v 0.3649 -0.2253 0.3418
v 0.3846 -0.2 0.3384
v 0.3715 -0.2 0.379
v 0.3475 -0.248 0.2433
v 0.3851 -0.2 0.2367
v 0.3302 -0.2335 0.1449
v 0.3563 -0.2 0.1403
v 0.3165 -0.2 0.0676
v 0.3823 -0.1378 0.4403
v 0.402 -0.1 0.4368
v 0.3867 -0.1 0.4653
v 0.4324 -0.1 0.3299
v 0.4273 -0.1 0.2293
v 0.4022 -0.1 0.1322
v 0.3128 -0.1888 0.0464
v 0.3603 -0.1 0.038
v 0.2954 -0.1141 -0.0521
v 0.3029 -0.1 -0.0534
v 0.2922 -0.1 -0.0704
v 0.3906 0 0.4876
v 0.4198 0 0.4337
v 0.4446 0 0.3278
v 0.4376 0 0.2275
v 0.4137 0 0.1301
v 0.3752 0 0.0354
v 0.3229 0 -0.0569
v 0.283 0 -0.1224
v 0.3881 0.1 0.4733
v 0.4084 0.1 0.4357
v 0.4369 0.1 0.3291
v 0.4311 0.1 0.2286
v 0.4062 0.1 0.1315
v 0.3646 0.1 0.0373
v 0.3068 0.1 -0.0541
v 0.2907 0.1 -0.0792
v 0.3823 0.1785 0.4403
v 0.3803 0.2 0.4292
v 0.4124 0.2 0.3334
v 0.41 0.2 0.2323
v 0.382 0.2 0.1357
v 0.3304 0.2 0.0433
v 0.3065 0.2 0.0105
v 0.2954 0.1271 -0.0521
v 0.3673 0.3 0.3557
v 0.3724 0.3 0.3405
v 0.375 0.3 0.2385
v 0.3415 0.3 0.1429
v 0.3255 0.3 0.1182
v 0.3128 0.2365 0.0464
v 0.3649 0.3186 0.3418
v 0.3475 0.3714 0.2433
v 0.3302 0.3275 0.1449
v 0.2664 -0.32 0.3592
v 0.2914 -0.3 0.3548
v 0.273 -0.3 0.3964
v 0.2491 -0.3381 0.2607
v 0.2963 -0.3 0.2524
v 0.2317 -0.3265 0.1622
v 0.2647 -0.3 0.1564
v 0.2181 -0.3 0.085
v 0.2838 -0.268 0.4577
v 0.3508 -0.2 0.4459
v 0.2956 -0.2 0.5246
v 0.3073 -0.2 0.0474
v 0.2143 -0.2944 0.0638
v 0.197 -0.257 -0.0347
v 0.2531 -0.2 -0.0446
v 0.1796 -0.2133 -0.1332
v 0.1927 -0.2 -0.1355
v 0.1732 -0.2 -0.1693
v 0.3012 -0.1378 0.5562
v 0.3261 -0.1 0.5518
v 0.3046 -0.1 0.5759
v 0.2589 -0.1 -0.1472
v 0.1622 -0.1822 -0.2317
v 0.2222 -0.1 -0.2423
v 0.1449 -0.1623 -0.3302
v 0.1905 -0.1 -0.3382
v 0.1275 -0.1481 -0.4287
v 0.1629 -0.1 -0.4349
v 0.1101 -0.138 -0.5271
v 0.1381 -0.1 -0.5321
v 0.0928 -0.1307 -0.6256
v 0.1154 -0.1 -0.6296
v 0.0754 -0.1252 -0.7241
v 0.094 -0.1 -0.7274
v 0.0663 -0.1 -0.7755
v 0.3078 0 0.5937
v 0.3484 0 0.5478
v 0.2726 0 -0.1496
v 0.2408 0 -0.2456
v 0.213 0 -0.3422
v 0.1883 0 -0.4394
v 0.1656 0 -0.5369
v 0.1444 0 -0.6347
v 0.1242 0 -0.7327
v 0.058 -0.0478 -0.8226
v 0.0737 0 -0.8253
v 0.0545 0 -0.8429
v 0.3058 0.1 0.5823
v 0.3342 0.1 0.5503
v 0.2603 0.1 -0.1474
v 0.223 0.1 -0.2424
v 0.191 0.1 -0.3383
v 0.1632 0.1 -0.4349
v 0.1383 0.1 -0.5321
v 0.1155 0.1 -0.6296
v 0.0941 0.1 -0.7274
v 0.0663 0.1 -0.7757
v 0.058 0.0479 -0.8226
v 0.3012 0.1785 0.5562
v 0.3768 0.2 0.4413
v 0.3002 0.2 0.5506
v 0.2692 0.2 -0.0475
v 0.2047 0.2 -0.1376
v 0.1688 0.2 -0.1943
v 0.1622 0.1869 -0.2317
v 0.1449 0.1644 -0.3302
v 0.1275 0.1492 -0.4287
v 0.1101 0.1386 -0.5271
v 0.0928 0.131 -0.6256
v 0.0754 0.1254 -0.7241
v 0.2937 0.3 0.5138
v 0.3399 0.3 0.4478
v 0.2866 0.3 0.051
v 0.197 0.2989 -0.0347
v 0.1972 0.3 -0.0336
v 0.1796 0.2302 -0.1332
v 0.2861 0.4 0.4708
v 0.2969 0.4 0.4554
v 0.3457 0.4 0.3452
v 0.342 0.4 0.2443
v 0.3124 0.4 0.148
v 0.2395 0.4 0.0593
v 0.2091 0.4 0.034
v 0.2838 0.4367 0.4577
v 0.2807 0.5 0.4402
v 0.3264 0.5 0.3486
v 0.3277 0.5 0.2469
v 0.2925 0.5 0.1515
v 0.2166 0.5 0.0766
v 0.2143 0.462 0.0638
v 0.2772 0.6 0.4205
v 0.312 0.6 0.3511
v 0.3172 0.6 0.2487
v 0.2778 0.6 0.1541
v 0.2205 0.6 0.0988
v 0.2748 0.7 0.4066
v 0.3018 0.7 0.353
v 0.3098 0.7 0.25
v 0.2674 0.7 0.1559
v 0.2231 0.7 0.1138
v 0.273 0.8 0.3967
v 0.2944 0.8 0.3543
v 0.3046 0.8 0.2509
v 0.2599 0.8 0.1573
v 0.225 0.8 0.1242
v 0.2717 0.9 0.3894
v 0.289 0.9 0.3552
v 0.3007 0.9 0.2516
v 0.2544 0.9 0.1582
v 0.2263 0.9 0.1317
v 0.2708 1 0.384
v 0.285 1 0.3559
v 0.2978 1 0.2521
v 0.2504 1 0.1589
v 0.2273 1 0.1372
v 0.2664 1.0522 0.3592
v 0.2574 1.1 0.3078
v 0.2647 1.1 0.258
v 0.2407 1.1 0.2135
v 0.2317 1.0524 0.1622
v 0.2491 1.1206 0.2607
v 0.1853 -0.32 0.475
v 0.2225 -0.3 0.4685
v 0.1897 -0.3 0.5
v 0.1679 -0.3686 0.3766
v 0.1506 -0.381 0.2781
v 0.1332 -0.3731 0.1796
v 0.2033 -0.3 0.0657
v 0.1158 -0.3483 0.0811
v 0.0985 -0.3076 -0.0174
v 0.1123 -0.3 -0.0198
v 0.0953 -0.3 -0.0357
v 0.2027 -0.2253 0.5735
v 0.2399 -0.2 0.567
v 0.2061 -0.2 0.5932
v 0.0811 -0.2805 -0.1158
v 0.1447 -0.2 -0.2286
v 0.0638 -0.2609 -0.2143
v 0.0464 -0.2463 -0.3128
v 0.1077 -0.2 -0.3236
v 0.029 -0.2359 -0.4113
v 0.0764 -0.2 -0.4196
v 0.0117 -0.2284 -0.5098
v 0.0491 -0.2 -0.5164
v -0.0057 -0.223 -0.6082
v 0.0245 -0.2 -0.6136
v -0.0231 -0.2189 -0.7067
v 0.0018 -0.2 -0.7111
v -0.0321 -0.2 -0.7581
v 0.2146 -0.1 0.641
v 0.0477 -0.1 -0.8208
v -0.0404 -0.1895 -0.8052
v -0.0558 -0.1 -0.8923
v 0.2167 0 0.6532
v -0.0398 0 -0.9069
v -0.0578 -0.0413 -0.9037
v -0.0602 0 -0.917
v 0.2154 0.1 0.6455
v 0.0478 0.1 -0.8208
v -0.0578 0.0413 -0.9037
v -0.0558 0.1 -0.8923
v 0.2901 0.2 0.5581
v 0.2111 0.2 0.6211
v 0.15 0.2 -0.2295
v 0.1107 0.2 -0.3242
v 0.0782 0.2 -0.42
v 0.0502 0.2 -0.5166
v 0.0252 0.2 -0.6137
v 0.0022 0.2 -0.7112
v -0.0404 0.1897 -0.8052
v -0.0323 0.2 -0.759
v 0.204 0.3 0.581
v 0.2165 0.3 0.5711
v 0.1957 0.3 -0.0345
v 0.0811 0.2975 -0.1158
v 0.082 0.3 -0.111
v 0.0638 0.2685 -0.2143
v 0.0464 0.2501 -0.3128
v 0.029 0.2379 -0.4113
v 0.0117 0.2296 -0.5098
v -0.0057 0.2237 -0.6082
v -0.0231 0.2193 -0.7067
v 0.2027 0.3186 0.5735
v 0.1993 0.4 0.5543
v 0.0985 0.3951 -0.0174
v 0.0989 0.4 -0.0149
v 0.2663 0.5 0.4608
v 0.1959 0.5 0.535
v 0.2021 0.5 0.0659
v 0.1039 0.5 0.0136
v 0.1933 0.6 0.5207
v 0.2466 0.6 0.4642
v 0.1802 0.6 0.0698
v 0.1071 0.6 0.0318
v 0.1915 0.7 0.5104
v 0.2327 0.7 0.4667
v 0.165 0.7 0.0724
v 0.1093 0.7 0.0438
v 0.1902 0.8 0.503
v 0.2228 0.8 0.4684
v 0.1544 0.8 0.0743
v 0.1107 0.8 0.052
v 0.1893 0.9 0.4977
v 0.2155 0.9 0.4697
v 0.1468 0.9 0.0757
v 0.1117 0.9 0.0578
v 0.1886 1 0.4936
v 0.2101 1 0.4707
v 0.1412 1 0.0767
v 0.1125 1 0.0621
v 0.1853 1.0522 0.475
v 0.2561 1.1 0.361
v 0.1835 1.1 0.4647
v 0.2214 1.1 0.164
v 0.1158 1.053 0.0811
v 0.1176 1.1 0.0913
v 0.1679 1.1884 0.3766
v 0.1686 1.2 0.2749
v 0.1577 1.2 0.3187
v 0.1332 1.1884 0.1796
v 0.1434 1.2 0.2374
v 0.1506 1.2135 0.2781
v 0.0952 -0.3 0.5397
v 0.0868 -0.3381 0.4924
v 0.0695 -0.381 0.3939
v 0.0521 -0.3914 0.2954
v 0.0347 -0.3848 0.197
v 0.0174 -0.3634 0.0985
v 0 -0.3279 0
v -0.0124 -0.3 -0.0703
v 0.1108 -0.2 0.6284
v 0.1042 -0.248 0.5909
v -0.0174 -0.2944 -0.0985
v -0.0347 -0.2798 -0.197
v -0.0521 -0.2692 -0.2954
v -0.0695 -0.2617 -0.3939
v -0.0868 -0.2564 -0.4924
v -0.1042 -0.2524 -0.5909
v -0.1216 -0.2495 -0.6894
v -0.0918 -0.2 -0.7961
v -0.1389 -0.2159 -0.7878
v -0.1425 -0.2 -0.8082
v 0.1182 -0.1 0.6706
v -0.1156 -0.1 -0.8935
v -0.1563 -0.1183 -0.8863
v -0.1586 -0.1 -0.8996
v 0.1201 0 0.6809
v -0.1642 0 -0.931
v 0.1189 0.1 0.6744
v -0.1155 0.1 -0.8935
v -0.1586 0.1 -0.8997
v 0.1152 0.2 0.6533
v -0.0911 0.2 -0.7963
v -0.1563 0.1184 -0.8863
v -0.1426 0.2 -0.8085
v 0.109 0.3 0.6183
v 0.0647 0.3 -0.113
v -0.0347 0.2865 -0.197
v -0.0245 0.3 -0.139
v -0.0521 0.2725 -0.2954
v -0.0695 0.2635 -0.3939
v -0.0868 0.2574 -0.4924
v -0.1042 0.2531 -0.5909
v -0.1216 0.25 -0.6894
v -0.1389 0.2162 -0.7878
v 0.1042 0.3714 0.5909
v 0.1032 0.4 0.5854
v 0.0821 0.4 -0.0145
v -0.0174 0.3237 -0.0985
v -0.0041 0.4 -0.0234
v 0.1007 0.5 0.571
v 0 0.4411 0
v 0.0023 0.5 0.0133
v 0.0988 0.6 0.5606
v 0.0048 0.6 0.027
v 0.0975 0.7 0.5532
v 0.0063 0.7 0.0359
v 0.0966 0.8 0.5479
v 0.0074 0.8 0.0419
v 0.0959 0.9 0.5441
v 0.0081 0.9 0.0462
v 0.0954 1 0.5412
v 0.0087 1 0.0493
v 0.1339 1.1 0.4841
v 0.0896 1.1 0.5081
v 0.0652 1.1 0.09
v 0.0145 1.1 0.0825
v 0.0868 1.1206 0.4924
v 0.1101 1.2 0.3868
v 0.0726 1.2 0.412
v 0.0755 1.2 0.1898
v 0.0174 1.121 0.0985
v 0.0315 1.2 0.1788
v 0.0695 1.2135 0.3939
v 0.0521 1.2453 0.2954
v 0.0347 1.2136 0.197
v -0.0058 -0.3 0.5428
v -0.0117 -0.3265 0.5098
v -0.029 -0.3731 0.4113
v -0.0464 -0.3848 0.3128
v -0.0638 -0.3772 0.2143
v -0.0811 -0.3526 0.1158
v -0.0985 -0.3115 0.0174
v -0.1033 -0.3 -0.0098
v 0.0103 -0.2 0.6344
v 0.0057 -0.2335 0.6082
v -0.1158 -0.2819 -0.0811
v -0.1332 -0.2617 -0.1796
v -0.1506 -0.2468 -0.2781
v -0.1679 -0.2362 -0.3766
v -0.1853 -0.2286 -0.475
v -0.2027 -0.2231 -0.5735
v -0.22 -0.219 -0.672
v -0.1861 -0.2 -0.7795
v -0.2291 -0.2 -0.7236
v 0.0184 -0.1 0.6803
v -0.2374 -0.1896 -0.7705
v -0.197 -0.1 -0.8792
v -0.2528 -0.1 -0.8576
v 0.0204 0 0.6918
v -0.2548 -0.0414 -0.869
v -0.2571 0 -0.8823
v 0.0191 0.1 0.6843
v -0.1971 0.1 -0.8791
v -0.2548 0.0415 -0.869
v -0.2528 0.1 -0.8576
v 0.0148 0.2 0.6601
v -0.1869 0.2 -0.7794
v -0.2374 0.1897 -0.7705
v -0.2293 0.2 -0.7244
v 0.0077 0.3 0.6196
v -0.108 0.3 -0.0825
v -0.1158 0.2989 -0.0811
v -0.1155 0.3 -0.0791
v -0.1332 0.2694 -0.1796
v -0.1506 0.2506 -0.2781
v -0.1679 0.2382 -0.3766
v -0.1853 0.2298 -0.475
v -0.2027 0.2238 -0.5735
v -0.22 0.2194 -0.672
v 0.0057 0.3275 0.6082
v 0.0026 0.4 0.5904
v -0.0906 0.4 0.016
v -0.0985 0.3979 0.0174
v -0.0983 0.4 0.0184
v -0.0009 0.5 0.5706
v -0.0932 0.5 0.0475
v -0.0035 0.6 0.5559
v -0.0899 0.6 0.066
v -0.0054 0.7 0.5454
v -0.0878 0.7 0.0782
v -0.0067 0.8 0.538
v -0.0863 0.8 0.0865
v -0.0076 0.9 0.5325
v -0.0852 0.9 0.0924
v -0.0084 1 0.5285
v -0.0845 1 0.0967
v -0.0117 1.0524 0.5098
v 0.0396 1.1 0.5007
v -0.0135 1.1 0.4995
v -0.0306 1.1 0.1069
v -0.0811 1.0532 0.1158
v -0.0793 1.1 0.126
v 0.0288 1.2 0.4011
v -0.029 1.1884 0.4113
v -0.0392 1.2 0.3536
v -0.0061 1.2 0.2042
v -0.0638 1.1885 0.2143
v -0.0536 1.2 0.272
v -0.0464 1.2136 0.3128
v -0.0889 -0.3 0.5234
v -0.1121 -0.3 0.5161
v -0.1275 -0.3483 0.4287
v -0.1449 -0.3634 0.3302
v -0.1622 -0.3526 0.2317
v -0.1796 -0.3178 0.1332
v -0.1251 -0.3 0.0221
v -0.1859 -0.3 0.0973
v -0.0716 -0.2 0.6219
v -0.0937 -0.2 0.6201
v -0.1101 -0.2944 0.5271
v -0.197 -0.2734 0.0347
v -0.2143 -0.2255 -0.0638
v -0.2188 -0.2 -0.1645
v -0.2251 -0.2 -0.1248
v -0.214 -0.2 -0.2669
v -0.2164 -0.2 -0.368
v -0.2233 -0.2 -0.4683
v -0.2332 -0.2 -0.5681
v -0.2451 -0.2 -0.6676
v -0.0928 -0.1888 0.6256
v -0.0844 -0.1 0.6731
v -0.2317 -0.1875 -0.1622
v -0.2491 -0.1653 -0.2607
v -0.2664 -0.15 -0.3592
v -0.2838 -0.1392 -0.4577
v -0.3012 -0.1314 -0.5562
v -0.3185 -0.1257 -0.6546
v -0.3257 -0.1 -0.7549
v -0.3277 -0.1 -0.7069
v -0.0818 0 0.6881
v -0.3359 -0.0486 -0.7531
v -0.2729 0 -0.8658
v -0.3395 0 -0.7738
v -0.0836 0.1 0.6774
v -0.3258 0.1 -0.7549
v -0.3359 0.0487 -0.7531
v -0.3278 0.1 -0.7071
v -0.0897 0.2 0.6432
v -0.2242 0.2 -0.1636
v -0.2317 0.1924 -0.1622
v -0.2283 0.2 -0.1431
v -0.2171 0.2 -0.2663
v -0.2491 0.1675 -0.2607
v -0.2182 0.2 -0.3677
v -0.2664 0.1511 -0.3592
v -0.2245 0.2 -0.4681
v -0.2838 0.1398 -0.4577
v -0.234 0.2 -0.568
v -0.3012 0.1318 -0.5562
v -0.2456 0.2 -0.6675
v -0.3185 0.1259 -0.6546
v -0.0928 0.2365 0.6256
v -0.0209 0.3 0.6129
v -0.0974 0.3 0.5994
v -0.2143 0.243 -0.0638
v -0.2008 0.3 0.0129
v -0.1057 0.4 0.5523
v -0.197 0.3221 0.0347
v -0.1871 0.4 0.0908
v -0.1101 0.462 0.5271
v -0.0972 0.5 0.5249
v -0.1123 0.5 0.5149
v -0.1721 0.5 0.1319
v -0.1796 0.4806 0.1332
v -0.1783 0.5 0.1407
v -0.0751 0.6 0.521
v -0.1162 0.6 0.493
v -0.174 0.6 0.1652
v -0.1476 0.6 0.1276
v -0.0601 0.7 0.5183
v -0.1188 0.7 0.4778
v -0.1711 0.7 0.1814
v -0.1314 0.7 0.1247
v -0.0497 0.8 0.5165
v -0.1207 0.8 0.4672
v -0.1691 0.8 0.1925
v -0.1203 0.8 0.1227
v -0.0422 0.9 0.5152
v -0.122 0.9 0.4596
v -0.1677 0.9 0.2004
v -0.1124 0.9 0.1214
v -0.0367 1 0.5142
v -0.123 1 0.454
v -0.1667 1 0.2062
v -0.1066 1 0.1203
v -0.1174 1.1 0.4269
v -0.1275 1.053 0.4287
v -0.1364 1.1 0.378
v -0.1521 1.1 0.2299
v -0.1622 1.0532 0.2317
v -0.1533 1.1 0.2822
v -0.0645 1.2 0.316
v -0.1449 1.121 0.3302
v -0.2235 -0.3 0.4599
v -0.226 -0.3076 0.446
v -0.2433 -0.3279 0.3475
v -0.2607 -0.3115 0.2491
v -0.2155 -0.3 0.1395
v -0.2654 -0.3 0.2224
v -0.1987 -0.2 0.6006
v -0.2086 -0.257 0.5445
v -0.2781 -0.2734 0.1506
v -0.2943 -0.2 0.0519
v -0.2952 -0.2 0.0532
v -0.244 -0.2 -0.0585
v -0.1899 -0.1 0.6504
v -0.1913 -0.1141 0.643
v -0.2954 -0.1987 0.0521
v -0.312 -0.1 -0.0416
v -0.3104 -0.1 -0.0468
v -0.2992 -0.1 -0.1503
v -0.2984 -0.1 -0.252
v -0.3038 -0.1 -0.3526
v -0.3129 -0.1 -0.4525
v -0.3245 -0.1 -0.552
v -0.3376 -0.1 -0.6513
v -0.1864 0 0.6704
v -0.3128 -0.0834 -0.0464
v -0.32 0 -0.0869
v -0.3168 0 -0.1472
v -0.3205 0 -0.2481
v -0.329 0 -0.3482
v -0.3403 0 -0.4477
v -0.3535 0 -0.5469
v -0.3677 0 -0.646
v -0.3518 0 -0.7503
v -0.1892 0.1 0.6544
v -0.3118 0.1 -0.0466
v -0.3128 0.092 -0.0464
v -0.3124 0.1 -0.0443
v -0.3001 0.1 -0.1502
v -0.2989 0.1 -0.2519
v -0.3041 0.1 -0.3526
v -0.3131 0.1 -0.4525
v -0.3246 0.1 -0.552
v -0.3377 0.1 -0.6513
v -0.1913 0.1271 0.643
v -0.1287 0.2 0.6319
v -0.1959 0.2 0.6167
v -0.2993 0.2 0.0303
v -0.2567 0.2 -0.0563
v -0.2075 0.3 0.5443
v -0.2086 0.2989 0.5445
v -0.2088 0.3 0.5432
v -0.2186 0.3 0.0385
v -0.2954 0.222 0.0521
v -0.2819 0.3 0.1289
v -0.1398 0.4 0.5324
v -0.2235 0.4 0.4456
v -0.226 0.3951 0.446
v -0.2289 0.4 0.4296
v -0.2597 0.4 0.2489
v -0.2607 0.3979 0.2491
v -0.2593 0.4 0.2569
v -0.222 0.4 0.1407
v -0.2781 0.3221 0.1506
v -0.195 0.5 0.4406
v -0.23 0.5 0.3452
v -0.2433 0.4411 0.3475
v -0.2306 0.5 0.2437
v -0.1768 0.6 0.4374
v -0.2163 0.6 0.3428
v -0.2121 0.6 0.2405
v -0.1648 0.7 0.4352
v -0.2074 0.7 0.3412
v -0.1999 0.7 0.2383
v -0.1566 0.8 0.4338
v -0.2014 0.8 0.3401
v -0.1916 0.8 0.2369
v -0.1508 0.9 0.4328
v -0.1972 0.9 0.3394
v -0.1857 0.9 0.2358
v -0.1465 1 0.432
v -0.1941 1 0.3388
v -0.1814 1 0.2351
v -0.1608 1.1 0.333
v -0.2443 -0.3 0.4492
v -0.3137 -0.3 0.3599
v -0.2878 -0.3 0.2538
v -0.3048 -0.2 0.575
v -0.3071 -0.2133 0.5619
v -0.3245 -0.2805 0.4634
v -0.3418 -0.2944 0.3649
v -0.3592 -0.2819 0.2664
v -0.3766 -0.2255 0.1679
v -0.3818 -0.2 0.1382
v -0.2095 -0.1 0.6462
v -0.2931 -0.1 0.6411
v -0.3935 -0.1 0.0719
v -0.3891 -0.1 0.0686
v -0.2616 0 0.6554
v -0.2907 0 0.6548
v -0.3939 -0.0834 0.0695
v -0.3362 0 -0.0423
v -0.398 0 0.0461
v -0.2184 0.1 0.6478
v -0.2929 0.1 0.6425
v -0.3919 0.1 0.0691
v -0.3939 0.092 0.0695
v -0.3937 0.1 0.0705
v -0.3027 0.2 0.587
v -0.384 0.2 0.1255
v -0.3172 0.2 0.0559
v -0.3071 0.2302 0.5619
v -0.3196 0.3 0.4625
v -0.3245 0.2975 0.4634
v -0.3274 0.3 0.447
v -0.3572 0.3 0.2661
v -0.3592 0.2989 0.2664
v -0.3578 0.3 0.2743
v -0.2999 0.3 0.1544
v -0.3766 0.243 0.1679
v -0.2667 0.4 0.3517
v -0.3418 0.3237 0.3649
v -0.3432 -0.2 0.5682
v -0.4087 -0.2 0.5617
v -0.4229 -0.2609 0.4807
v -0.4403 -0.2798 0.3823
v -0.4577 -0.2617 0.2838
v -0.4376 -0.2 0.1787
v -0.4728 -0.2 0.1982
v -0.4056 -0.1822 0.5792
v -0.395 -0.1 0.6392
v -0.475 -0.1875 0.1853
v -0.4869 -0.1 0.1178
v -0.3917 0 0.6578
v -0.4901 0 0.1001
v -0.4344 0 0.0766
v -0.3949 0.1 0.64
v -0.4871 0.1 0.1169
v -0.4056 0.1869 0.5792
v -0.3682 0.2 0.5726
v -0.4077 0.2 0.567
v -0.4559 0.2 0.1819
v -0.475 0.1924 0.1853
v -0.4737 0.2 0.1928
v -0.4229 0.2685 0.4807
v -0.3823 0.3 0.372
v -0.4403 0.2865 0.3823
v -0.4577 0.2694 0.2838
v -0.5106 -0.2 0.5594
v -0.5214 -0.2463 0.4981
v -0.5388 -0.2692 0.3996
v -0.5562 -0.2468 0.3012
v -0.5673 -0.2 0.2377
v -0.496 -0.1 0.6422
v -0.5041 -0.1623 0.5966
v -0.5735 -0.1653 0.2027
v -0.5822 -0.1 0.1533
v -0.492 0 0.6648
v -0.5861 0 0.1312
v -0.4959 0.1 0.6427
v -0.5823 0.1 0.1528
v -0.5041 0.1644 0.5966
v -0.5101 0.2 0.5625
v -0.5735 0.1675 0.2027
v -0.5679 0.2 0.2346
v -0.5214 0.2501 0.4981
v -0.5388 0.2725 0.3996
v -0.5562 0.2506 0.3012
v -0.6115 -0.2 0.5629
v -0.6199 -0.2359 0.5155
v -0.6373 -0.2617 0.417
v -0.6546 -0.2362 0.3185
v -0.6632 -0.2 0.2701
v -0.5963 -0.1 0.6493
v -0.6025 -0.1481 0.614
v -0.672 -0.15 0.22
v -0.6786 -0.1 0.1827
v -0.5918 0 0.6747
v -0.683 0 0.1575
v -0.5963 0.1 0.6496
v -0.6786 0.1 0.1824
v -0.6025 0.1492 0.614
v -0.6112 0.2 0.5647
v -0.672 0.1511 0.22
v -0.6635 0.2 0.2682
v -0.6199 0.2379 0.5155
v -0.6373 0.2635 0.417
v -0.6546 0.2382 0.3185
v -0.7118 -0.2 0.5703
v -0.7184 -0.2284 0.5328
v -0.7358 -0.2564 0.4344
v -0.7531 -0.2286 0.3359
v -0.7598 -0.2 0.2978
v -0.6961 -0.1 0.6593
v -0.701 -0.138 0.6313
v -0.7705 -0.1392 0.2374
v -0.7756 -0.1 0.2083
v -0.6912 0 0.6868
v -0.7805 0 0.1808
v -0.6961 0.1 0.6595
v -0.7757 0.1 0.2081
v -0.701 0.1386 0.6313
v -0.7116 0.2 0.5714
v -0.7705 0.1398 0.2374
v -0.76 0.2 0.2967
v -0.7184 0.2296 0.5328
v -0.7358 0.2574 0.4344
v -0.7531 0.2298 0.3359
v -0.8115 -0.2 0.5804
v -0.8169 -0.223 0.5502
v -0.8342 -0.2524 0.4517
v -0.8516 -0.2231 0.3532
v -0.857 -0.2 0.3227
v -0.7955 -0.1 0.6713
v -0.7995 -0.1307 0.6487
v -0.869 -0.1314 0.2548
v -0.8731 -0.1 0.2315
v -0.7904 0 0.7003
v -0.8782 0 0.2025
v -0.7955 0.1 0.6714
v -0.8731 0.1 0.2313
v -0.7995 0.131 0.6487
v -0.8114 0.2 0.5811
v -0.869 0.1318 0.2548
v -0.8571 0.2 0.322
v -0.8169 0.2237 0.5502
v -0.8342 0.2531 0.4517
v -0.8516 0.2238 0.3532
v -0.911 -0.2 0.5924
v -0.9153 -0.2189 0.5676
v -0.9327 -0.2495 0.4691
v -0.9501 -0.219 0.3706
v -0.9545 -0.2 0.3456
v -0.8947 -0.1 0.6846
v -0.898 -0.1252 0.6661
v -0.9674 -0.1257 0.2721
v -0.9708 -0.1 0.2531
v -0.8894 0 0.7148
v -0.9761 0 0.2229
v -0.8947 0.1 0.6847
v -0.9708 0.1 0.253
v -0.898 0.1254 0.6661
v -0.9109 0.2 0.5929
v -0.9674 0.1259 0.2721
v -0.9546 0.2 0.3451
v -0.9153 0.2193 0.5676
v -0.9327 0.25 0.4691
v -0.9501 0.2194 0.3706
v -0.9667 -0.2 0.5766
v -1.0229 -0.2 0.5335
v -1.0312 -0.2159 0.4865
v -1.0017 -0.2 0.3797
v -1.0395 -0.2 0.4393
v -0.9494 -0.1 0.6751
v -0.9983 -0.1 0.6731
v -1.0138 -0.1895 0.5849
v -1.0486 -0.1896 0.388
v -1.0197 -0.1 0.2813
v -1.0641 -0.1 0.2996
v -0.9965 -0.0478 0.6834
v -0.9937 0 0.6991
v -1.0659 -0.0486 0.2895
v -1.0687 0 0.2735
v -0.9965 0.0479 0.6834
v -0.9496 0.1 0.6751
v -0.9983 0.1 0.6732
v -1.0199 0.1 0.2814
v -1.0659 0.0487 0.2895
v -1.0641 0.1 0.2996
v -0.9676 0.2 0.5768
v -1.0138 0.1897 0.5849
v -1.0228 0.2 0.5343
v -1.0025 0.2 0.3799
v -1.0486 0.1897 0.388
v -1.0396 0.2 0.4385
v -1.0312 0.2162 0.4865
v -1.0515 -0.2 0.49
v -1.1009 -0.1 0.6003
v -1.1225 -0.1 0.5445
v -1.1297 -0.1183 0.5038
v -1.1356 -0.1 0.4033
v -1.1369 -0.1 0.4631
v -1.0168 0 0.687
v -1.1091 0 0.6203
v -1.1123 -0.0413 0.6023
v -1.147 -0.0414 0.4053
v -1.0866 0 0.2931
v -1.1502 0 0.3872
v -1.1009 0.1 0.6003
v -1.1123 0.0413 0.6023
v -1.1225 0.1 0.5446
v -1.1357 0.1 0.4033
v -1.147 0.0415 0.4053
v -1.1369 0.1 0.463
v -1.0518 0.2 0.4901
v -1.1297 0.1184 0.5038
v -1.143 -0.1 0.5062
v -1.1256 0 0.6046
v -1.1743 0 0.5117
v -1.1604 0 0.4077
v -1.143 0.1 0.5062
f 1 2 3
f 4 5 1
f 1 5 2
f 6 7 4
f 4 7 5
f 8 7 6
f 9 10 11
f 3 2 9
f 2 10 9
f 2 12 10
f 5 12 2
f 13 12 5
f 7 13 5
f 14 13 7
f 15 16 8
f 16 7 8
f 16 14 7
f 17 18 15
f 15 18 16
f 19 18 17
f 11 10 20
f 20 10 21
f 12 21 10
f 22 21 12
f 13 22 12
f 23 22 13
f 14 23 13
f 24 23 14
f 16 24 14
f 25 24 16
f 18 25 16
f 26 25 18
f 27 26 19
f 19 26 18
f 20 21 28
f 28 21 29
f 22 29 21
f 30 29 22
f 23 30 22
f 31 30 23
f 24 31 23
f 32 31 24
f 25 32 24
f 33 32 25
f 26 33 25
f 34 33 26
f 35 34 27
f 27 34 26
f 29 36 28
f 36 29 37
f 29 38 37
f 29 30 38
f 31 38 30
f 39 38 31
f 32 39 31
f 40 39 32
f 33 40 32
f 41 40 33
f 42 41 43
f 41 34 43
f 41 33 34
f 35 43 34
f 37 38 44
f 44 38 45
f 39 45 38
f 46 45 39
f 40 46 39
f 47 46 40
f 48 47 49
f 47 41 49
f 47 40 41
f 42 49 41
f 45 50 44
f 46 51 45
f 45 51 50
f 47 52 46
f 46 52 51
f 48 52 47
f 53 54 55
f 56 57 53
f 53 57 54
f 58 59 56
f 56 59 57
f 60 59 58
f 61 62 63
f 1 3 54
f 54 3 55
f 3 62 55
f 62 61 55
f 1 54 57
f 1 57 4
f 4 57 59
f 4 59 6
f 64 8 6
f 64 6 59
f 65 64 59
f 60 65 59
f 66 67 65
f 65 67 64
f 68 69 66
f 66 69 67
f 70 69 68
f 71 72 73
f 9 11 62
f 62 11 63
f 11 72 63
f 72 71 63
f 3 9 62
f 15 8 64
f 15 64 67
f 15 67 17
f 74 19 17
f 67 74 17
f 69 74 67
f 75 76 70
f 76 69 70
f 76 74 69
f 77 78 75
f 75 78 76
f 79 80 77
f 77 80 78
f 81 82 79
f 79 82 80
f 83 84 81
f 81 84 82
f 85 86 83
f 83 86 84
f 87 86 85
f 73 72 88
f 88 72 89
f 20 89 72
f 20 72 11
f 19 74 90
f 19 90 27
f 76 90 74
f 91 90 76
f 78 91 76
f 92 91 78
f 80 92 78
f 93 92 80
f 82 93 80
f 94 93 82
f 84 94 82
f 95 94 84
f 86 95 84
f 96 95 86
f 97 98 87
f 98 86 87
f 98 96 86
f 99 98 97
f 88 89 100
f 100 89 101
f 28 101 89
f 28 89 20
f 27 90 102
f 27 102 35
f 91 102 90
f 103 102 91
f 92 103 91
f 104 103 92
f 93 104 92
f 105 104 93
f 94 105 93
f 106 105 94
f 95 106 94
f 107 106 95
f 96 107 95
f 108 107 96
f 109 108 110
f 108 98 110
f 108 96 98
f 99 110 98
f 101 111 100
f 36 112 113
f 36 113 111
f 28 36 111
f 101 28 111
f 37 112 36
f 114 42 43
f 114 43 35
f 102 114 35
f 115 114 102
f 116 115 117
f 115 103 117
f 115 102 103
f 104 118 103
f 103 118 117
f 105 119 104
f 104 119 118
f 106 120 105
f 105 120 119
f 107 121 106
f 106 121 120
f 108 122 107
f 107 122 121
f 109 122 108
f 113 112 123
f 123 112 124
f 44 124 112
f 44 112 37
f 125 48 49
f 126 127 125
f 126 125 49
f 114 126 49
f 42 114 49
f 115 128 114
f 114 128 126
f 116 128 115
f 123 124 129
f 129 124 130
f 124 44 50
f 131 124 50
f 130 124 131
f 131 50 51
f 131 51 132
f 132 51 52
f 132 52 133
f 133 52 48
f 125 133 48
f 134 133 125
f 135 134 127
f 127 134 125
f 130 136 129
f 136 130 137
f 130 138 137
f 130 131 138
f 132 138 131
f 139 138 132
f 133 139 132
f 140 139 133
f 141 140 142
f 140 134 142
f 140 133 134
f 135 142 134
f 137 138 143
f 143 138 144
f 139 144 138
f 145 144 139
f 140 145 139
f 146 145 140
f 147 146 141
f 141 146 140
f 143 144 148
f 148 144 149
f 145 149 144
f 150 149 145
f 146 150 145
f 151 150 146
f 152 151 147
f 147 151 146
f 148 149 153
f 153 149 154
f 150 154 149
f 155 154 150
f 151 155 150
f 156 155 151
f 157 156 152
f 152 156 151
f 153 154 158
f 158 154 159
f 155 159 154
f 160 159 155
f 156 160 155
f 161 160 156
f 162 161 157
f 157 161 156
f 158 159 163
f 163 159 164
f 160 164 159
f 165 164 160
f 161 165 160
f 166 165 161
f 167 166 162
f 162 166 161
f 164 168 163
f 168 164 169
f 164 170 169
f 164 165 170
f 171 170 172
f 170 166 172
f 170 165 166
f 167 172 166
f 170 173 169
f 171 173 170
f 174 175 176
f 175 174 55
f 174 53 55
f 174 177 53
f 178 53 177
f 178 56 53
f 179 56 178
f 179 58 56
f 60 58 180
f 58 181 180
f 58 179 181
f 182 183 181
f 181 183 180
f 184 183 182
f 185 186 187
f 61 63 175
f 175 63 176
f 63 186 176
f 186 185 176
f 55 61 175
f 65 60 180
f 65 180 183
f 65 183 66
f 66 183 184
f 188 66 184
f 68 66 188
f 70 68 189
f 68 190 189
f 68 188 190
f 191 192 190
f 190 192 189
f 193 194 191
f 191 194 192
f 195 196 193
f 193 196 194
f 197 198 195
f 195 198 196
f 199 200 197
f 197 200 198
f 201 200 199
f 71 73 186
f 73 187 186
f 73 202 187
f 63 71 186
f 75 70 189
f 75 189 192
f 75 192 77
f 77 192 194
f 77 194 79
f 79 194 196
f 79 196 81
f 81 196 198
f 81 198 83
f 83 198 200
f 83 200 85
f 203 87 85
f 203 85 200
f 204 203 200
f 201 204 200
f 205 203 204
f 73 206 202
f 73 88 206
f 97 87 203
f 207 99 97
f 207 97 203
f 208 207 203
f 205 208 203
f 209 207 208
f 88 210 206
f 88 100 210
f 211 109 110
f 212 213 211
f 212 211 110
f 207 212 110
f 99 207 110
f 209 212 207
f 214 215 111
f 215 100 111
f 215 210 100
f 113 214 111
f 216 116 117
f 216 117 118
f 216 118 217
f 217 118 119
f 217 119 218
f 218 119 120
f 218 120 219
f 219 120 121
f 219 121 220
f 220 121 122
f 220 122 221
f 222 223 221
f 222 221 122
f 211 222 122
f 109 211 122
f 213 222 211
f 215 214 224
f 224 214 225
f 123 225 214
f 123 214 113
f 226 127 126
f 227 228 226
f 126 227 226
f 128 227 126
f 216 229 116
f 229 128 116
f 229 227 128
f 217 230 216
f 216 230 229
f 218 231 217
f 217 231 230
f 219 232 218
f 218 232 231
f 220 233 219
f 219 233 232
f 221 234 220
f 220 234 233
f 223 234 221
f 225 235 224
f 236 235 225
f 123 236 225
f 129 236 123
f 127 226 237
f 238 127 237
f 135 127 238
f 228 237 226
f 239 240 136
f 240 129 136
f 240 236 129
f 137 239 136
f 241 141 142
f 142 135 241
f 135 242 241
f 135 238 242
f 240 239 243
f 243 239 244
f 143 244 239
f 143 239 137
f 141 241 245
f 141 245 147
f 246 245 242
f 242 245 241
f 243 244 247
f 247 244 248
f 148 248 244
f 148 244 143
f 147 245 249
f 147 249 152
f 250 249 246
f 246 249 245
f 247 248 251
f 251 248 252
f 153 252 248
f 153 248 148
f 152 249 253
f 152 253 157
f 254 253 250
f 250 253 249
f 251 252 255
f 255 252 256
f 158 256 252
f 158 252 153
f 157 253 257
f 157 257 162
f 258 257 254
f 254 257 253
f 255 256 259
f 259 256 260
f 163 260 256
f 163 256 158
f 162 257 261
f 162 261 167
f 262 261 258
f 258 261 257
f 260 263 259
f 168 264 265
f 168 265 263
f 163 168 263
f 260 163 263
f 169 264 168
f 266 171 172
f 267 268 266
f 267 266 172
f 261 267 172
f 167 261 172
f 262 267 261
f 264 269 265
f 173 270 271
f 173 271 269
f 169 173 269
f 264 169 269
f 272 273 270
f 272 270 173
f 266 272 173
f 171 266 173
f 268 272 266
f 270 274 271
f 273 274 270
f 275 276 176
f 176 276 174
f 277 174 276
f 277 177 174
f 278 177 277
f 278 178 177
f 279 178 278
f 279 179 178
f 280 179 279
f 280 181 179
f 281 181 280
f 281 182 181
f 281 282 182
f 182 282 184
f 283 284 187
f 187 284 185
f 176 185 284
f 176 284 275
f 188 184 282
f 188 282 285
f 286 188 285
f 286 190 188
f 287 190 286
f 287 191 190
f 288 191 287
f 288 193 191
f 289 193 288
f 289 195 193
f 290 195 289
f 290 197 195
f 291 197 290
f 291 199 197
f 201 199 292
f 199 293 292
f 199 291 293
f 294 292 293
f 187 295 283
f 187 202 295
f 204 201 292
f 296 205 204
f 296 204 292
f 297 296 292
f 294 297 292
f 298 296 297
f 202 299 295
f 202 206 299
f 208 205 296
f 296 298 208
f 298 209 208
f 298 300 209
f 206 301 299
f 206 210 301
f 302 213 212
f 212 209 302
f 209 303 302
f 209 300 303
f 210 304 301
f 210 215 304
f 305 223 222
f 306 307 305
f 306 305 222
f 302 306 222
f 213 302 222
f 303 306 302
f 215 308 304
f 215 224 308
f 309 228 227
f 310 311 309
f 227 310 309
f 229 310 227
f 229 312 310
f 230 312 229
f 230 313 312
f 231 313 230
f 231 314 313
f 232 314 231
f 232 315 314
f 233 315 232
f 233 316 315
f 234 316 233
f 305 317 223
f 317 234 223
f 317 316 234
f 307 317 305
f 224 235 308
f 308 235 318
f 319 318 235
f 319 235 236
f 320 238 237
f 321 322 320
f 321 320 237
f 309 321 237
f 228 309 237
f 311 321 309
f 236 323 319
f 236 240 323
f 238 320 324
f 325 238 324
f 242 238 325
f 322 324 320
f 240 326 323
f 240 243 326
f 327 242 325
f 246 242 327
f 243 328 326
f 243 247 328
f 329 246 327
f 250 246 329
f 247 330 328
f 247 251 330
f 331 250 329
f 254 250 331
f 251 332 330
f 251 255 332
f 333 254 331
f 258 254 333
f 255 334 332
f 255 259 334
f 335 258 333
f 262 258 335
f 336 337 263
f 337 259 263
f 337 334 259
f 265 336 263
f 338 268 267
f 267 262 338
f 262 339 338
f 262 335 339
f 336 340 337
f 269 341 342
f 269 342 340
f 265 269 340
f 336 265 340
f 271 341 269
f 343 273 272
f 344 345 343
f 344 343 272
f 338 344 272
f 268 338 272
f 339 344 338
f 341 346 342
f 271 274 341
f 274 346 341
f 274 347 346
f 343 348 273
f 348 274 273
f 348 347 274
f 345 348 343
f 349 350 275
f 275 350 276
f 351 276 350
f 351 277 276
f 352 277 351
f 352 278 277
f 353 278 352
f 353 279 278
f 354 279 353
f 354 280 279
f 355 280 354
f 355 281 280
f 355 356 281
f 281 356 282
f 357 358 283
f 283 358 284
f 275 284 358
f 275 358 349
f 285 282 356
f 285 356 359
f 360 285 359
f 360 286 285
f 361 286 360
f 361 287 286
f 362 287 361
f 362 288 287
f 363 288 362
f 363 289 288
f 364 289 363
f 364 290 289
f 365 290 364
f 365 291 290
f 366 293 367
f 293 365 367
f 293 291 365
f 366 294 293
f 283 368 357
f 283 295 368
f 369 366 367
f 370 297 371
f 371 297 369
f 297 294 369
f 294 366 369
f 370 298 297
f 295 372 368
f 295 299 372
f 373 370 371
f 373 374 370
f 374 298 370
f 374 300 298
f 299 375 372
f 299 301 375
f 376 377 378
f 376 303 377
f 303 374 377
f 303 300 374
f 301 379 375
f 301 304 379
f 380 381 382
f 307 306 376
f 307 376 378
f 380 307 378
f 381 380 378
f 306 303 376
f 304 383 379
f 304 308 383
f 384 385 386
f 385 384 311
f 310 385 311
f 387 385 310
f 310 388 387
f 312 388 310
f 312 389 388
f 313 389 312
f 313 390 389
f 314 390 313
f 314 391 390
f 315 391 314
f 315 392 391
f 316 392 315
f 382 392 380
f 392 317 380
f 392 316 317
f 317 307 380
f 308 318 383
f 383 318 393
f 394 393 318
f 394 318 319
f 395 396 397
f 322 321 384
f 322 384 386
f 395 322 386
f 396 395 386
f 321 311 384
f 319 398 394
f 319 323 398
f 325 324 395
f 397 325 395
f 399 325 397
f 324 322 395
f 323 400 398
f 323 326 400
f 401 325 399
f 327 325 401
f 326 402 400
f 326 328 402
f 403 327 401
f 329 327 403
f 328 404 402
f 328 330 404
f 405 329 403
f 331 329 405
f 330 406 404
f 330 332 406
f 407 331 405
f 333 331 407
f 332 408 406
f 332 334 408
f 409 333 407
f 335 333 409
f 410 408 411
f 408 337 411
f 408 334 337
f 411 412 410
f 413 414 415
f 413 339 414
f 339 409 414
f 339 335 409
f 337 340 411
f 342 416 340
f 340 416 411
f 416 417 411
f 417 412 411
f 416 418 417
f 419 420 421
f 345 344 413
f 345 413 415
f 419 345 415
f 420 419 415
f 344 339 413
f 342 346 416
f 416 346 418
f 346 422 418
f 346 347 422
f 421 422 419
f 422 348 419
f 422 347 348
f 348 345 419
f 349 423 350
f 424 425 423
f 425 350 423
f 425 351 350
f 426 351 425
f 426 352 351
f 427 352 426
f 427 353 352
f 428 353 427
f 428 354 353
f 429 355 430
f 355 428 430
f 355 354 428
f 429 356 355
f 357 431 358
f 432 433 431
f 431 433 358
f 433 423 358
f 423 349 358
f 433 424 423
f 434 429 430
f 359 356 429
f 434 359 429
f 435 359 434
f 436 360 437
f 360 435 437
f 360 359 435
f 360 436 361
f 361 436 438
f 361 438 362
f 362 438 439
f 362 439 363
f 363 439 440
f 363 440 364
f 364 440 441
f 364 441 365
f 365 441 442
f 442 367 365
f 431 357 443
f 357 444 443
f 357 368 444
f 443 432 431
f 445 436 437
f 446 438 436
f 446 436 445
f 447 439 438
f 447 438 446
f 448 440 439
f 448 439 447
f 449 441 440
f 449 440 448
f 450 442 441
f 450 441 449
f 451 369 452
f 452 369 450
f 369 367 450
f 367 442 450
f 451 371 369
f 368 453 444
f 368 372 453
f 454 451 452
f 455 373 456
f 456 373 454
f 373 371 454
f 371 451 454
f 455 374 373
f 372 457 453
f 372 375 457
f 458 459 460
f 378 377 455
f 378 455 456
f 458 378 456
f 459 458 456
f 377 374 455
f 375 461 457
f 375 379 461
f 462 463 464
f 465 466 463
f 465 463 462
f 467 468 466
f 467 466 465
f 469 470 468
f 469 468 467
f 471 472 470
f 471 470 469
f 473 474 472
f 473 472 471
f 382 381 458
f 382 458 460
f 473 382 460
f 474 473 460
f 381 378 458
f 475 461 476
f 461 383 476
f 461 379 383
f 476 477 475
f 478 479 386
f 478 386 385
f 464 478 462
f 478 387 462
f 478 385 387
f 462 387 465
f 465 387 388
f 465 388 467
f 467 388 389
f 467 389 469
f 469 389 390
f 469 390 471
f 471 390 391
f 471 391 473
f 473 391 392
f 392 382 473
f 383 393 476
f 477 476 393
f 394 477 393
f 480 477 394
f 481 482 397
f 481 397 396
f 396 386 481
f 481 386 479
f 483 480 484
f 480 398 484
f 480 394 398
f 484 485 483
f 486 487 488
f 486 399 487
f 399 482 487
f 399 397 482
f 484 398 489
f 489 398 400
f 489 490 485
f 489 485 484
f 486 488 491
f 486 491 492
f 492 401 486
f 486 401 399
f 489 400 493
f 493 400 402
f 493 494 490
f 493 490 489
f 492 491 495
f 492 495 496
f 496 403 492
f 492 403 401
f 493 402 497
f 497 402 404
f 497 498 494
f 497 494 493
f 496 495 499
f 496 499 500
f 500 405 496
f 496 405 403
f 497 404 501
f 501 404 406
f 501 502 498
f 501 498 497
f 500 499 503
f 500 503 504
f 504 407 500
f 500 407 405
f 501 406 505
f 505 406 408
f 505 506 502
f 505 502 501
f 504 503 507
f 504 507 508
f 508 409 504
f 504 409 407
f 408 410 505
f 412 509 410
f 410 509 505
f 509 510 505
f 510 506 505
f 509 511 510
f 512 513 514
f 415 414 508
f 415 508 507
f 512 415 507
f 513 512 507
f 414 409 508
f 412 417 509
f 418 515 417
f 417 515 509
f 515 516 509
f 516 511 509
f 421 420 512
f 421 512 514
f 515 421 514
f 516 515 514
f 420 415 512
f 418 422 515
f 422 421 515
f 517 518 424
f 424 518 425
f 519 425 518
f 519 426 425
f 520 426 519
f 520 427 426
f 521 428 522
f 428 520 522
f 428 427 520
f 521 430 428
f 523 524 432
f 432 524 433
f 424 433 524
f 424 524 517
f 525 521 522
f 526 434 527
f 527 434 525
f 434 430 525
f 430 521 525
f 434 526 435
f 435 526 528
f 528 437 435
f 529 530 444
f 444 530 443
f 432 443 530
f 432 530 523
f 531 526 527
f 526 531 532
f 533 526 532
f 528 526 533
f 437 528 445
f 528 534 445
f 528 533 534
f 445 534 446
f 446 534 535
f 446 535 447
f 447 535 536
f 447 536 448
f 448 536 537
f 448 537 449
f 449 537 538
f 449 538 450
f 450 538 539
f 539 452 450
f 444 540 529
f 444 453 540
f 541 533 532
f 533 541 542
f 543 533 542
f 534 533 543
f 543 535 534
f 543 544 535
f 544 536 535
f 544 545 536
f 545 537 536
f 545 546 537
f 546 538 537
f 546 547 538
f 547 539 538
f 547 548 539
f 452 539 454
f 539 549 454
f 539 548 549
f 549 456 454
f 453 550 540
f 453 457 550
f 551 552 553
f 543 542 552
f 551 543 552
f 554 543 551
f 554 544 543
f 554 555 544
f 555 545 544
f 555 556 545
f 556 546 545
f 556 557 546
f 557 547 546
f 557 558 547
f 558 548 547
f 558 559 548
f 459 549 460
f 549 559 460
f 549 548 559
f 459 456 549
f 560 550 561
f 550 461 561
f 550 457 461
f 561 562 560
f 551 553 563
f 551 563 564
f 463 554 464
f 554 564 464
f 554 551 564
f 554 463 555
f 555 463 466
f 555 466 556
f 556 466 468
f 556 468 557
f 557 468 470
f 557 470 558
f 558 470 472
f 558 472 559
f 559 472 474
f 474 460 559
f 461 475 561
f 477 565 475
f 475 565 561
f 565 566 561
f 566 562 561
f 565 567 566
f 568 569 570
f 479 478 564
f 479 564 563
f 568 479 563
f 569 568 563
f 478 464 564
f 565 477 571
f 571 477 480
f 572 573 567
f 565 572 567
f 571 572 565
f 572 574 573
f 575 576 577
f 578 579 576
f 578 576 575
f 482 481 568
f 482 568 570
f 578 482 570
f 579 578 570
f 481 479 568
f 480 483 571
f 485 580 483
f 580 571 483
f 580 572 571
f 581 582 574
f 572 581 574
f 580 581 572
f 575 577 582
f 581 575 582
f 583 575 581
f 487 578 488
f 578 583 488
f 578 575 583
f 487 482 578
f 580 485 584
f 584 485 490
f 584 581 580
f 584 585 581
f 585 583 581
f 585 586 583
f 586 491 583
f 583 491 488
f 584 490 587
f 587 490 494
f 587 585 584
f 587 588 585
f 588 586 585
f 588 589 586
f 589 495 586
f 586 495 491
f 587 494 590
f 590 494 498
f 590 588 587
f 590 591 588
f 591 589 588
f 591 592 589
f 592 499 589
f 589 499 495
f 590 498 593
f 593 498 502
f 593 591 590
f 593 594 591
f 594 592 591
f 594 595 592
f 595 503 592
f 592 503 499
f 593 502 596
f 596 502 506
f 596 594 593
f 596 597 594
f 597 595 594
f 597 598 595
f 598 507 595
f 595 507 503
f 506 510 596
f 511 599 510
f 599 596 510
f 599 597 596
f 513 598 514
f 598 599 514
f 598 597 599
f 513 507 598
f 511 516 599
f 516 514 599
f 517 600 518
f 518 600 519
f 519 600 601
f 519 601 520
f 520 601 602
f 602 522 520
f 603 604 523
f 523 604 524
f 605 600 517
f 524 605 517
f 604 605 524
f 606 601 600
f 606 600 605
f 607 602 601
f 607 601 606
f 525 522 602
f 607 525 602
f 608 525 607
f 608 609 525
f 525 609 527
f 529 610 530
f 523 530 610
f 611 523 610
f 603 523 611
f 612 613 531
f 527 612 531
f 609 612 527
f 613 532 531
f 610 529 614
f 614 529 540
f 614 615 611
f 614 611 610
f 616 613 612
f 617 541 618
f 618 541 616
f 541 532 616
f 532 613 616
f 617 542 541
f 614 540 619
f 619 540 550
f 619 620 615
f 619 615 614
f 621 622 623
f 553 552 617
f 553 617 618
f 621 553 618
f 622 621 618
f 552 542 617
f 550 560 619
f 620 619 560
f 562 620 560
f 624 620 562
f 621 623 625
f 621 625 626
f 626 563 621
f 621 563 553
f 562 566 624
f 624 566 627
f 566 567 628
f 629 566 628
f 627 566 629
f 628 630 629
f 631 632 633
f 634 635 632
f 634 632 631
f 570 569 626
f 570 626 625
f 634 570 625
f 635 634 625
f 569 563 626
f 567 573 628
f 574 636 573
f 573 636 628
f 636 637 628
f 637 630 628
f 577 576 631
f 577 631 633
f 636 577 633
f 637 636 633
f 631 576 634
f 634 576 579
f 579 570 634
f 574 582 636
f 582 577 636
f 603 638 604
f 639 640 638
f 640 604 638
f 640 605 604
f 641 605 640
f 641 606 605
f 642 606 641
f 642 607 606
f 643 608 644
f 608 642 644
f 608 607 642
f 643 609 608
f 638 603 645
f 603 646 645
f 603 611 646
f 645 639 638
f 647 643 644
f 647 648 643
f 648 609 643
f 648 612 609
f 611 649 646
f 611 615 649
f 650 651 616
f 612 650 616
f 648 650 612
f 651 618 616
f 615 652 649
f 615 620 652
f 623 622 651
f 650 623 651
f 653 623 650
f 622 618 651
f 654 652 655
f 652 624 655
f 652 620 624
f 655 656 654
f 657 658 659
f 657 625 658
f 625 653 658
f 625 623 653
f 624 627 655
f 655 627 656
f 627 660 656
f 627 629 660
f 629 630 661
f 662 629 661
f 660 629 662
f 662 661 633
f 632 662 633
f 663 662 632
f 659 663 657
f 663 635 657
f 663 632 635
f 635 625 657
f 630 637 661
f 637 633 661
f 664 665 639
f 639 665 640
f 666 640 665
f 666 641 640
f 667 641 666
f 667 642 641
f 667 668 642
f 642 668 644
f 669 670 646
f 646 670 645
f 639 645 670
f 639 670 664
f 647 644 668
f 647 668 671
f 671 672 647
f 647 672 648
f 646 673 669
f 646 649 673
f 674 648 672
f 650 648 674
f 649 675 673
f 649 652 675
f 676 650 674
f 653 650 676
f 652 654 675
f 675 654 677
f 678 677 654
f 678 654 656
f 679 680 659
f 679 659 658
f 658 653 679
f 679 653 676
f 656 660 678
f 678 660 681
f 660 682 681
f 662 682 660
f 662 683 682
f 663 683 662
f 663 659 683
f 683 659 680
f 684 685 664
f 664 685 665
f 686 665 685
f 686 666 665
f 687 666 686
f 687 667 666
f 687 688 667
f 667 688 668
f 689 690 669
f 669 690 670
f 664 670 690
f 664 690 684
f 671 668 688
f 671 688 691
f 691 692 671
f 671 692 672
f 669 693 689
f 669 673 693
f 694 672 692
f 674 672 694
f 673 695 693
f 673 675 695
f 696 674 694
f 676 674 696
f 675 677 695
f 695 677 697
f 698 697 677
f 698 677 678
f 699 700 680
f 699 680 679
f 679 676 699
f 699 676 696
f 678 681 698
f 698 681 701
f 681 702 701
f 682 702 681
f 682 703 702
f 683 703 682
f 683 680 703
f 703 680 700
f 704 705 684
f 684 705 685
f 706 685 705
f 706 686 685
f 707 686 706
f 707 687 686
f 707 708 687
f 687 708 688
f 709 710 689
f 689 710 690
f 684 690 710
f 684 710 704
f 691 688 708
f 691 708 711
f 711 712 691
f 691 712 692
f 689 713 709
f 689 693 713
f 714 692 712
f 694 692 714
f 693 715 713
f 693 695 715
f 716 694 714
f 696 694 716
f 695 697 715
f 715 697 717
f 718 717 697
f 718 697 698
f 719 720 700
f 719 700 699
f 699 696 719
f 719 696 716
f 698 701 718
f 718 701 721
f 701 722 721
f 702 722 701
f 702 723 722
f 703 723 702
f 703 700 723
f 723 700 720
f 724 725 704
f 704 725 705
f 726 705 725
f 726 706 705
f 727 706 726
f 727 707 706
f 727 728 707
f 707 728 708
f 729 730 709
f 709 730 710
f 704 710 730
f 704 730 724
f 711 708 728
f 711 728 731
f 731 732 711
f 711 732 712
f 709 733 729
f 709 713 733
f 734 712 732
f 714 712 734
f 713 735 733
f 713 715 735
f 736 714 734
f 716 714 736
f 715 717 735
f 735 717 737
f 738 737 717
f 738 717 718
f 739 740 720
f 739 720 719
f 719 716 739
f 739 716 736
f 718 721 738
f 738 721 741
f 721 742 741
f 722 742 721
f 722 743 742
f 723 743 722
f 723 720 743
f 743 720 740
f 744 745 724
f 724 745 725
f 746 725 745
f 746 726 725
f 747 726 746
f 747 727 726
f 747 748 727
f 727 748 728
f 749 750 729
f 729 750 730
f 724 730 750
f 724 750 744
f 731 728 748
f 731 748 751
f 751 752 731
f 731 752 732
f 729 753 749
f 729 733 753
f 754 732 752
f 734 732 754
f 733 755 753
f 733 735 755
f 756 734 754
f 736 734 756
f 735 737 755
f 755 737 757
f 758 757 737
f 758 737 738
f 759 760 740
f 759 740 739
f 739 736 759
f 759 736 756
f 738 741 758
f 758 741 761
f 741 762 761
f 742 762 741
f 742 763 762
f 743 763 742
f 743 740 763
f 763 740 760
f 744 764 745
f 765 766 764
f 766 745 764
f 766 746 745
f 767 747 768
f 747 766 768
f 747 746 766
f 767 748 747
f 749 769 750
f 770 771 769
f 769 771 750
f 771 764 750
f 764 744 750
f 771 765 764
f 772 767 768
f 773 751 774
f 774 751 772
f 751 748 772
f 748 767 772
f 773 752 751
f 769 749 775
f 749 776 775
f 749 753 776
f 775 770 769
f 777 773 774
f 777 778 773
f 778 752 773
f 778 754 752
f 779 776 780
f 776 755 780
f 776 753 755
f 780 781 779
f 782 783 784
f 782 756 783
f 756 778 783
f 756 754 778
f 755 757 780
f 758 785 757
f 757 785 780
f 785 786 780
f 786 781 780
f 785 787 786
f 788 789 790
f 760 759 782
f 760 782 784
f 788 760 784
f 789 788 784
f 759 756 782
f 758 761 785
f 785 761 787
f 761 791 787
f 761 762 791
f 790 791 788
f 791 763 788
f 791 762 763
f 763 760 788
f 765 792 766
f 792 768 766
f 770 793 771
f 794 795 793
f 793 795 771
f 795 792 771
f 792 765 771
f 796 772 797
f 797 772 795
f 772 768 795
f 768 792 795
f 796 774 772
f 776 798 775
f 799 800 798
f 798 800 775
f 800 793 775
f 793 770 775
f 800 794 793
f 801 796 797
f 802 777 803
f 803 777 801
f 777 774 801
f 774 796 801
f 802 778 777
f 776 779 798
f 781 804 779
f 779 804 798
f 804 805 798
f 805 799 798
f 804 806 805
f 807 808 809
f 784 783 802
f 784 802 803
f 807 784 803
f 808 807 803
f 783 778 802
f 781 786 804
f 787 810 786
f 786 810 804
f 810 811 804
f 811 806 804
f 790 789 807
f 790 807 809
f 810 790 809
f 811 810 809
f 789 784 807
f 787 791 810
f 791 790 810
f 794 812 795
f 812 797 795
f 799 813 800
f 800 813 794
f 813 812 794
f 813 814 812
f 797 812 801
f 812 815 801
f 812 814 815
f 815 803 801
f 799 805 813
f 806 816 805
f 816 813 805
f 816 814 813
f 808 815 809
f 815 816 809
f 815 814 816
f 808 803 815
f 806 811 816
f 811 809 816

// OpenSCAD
rotate( v=[0,1,0], a=190 ) {
    translate( [0,0,-.3] ) {
        include <test.scad>; 
    };
};
